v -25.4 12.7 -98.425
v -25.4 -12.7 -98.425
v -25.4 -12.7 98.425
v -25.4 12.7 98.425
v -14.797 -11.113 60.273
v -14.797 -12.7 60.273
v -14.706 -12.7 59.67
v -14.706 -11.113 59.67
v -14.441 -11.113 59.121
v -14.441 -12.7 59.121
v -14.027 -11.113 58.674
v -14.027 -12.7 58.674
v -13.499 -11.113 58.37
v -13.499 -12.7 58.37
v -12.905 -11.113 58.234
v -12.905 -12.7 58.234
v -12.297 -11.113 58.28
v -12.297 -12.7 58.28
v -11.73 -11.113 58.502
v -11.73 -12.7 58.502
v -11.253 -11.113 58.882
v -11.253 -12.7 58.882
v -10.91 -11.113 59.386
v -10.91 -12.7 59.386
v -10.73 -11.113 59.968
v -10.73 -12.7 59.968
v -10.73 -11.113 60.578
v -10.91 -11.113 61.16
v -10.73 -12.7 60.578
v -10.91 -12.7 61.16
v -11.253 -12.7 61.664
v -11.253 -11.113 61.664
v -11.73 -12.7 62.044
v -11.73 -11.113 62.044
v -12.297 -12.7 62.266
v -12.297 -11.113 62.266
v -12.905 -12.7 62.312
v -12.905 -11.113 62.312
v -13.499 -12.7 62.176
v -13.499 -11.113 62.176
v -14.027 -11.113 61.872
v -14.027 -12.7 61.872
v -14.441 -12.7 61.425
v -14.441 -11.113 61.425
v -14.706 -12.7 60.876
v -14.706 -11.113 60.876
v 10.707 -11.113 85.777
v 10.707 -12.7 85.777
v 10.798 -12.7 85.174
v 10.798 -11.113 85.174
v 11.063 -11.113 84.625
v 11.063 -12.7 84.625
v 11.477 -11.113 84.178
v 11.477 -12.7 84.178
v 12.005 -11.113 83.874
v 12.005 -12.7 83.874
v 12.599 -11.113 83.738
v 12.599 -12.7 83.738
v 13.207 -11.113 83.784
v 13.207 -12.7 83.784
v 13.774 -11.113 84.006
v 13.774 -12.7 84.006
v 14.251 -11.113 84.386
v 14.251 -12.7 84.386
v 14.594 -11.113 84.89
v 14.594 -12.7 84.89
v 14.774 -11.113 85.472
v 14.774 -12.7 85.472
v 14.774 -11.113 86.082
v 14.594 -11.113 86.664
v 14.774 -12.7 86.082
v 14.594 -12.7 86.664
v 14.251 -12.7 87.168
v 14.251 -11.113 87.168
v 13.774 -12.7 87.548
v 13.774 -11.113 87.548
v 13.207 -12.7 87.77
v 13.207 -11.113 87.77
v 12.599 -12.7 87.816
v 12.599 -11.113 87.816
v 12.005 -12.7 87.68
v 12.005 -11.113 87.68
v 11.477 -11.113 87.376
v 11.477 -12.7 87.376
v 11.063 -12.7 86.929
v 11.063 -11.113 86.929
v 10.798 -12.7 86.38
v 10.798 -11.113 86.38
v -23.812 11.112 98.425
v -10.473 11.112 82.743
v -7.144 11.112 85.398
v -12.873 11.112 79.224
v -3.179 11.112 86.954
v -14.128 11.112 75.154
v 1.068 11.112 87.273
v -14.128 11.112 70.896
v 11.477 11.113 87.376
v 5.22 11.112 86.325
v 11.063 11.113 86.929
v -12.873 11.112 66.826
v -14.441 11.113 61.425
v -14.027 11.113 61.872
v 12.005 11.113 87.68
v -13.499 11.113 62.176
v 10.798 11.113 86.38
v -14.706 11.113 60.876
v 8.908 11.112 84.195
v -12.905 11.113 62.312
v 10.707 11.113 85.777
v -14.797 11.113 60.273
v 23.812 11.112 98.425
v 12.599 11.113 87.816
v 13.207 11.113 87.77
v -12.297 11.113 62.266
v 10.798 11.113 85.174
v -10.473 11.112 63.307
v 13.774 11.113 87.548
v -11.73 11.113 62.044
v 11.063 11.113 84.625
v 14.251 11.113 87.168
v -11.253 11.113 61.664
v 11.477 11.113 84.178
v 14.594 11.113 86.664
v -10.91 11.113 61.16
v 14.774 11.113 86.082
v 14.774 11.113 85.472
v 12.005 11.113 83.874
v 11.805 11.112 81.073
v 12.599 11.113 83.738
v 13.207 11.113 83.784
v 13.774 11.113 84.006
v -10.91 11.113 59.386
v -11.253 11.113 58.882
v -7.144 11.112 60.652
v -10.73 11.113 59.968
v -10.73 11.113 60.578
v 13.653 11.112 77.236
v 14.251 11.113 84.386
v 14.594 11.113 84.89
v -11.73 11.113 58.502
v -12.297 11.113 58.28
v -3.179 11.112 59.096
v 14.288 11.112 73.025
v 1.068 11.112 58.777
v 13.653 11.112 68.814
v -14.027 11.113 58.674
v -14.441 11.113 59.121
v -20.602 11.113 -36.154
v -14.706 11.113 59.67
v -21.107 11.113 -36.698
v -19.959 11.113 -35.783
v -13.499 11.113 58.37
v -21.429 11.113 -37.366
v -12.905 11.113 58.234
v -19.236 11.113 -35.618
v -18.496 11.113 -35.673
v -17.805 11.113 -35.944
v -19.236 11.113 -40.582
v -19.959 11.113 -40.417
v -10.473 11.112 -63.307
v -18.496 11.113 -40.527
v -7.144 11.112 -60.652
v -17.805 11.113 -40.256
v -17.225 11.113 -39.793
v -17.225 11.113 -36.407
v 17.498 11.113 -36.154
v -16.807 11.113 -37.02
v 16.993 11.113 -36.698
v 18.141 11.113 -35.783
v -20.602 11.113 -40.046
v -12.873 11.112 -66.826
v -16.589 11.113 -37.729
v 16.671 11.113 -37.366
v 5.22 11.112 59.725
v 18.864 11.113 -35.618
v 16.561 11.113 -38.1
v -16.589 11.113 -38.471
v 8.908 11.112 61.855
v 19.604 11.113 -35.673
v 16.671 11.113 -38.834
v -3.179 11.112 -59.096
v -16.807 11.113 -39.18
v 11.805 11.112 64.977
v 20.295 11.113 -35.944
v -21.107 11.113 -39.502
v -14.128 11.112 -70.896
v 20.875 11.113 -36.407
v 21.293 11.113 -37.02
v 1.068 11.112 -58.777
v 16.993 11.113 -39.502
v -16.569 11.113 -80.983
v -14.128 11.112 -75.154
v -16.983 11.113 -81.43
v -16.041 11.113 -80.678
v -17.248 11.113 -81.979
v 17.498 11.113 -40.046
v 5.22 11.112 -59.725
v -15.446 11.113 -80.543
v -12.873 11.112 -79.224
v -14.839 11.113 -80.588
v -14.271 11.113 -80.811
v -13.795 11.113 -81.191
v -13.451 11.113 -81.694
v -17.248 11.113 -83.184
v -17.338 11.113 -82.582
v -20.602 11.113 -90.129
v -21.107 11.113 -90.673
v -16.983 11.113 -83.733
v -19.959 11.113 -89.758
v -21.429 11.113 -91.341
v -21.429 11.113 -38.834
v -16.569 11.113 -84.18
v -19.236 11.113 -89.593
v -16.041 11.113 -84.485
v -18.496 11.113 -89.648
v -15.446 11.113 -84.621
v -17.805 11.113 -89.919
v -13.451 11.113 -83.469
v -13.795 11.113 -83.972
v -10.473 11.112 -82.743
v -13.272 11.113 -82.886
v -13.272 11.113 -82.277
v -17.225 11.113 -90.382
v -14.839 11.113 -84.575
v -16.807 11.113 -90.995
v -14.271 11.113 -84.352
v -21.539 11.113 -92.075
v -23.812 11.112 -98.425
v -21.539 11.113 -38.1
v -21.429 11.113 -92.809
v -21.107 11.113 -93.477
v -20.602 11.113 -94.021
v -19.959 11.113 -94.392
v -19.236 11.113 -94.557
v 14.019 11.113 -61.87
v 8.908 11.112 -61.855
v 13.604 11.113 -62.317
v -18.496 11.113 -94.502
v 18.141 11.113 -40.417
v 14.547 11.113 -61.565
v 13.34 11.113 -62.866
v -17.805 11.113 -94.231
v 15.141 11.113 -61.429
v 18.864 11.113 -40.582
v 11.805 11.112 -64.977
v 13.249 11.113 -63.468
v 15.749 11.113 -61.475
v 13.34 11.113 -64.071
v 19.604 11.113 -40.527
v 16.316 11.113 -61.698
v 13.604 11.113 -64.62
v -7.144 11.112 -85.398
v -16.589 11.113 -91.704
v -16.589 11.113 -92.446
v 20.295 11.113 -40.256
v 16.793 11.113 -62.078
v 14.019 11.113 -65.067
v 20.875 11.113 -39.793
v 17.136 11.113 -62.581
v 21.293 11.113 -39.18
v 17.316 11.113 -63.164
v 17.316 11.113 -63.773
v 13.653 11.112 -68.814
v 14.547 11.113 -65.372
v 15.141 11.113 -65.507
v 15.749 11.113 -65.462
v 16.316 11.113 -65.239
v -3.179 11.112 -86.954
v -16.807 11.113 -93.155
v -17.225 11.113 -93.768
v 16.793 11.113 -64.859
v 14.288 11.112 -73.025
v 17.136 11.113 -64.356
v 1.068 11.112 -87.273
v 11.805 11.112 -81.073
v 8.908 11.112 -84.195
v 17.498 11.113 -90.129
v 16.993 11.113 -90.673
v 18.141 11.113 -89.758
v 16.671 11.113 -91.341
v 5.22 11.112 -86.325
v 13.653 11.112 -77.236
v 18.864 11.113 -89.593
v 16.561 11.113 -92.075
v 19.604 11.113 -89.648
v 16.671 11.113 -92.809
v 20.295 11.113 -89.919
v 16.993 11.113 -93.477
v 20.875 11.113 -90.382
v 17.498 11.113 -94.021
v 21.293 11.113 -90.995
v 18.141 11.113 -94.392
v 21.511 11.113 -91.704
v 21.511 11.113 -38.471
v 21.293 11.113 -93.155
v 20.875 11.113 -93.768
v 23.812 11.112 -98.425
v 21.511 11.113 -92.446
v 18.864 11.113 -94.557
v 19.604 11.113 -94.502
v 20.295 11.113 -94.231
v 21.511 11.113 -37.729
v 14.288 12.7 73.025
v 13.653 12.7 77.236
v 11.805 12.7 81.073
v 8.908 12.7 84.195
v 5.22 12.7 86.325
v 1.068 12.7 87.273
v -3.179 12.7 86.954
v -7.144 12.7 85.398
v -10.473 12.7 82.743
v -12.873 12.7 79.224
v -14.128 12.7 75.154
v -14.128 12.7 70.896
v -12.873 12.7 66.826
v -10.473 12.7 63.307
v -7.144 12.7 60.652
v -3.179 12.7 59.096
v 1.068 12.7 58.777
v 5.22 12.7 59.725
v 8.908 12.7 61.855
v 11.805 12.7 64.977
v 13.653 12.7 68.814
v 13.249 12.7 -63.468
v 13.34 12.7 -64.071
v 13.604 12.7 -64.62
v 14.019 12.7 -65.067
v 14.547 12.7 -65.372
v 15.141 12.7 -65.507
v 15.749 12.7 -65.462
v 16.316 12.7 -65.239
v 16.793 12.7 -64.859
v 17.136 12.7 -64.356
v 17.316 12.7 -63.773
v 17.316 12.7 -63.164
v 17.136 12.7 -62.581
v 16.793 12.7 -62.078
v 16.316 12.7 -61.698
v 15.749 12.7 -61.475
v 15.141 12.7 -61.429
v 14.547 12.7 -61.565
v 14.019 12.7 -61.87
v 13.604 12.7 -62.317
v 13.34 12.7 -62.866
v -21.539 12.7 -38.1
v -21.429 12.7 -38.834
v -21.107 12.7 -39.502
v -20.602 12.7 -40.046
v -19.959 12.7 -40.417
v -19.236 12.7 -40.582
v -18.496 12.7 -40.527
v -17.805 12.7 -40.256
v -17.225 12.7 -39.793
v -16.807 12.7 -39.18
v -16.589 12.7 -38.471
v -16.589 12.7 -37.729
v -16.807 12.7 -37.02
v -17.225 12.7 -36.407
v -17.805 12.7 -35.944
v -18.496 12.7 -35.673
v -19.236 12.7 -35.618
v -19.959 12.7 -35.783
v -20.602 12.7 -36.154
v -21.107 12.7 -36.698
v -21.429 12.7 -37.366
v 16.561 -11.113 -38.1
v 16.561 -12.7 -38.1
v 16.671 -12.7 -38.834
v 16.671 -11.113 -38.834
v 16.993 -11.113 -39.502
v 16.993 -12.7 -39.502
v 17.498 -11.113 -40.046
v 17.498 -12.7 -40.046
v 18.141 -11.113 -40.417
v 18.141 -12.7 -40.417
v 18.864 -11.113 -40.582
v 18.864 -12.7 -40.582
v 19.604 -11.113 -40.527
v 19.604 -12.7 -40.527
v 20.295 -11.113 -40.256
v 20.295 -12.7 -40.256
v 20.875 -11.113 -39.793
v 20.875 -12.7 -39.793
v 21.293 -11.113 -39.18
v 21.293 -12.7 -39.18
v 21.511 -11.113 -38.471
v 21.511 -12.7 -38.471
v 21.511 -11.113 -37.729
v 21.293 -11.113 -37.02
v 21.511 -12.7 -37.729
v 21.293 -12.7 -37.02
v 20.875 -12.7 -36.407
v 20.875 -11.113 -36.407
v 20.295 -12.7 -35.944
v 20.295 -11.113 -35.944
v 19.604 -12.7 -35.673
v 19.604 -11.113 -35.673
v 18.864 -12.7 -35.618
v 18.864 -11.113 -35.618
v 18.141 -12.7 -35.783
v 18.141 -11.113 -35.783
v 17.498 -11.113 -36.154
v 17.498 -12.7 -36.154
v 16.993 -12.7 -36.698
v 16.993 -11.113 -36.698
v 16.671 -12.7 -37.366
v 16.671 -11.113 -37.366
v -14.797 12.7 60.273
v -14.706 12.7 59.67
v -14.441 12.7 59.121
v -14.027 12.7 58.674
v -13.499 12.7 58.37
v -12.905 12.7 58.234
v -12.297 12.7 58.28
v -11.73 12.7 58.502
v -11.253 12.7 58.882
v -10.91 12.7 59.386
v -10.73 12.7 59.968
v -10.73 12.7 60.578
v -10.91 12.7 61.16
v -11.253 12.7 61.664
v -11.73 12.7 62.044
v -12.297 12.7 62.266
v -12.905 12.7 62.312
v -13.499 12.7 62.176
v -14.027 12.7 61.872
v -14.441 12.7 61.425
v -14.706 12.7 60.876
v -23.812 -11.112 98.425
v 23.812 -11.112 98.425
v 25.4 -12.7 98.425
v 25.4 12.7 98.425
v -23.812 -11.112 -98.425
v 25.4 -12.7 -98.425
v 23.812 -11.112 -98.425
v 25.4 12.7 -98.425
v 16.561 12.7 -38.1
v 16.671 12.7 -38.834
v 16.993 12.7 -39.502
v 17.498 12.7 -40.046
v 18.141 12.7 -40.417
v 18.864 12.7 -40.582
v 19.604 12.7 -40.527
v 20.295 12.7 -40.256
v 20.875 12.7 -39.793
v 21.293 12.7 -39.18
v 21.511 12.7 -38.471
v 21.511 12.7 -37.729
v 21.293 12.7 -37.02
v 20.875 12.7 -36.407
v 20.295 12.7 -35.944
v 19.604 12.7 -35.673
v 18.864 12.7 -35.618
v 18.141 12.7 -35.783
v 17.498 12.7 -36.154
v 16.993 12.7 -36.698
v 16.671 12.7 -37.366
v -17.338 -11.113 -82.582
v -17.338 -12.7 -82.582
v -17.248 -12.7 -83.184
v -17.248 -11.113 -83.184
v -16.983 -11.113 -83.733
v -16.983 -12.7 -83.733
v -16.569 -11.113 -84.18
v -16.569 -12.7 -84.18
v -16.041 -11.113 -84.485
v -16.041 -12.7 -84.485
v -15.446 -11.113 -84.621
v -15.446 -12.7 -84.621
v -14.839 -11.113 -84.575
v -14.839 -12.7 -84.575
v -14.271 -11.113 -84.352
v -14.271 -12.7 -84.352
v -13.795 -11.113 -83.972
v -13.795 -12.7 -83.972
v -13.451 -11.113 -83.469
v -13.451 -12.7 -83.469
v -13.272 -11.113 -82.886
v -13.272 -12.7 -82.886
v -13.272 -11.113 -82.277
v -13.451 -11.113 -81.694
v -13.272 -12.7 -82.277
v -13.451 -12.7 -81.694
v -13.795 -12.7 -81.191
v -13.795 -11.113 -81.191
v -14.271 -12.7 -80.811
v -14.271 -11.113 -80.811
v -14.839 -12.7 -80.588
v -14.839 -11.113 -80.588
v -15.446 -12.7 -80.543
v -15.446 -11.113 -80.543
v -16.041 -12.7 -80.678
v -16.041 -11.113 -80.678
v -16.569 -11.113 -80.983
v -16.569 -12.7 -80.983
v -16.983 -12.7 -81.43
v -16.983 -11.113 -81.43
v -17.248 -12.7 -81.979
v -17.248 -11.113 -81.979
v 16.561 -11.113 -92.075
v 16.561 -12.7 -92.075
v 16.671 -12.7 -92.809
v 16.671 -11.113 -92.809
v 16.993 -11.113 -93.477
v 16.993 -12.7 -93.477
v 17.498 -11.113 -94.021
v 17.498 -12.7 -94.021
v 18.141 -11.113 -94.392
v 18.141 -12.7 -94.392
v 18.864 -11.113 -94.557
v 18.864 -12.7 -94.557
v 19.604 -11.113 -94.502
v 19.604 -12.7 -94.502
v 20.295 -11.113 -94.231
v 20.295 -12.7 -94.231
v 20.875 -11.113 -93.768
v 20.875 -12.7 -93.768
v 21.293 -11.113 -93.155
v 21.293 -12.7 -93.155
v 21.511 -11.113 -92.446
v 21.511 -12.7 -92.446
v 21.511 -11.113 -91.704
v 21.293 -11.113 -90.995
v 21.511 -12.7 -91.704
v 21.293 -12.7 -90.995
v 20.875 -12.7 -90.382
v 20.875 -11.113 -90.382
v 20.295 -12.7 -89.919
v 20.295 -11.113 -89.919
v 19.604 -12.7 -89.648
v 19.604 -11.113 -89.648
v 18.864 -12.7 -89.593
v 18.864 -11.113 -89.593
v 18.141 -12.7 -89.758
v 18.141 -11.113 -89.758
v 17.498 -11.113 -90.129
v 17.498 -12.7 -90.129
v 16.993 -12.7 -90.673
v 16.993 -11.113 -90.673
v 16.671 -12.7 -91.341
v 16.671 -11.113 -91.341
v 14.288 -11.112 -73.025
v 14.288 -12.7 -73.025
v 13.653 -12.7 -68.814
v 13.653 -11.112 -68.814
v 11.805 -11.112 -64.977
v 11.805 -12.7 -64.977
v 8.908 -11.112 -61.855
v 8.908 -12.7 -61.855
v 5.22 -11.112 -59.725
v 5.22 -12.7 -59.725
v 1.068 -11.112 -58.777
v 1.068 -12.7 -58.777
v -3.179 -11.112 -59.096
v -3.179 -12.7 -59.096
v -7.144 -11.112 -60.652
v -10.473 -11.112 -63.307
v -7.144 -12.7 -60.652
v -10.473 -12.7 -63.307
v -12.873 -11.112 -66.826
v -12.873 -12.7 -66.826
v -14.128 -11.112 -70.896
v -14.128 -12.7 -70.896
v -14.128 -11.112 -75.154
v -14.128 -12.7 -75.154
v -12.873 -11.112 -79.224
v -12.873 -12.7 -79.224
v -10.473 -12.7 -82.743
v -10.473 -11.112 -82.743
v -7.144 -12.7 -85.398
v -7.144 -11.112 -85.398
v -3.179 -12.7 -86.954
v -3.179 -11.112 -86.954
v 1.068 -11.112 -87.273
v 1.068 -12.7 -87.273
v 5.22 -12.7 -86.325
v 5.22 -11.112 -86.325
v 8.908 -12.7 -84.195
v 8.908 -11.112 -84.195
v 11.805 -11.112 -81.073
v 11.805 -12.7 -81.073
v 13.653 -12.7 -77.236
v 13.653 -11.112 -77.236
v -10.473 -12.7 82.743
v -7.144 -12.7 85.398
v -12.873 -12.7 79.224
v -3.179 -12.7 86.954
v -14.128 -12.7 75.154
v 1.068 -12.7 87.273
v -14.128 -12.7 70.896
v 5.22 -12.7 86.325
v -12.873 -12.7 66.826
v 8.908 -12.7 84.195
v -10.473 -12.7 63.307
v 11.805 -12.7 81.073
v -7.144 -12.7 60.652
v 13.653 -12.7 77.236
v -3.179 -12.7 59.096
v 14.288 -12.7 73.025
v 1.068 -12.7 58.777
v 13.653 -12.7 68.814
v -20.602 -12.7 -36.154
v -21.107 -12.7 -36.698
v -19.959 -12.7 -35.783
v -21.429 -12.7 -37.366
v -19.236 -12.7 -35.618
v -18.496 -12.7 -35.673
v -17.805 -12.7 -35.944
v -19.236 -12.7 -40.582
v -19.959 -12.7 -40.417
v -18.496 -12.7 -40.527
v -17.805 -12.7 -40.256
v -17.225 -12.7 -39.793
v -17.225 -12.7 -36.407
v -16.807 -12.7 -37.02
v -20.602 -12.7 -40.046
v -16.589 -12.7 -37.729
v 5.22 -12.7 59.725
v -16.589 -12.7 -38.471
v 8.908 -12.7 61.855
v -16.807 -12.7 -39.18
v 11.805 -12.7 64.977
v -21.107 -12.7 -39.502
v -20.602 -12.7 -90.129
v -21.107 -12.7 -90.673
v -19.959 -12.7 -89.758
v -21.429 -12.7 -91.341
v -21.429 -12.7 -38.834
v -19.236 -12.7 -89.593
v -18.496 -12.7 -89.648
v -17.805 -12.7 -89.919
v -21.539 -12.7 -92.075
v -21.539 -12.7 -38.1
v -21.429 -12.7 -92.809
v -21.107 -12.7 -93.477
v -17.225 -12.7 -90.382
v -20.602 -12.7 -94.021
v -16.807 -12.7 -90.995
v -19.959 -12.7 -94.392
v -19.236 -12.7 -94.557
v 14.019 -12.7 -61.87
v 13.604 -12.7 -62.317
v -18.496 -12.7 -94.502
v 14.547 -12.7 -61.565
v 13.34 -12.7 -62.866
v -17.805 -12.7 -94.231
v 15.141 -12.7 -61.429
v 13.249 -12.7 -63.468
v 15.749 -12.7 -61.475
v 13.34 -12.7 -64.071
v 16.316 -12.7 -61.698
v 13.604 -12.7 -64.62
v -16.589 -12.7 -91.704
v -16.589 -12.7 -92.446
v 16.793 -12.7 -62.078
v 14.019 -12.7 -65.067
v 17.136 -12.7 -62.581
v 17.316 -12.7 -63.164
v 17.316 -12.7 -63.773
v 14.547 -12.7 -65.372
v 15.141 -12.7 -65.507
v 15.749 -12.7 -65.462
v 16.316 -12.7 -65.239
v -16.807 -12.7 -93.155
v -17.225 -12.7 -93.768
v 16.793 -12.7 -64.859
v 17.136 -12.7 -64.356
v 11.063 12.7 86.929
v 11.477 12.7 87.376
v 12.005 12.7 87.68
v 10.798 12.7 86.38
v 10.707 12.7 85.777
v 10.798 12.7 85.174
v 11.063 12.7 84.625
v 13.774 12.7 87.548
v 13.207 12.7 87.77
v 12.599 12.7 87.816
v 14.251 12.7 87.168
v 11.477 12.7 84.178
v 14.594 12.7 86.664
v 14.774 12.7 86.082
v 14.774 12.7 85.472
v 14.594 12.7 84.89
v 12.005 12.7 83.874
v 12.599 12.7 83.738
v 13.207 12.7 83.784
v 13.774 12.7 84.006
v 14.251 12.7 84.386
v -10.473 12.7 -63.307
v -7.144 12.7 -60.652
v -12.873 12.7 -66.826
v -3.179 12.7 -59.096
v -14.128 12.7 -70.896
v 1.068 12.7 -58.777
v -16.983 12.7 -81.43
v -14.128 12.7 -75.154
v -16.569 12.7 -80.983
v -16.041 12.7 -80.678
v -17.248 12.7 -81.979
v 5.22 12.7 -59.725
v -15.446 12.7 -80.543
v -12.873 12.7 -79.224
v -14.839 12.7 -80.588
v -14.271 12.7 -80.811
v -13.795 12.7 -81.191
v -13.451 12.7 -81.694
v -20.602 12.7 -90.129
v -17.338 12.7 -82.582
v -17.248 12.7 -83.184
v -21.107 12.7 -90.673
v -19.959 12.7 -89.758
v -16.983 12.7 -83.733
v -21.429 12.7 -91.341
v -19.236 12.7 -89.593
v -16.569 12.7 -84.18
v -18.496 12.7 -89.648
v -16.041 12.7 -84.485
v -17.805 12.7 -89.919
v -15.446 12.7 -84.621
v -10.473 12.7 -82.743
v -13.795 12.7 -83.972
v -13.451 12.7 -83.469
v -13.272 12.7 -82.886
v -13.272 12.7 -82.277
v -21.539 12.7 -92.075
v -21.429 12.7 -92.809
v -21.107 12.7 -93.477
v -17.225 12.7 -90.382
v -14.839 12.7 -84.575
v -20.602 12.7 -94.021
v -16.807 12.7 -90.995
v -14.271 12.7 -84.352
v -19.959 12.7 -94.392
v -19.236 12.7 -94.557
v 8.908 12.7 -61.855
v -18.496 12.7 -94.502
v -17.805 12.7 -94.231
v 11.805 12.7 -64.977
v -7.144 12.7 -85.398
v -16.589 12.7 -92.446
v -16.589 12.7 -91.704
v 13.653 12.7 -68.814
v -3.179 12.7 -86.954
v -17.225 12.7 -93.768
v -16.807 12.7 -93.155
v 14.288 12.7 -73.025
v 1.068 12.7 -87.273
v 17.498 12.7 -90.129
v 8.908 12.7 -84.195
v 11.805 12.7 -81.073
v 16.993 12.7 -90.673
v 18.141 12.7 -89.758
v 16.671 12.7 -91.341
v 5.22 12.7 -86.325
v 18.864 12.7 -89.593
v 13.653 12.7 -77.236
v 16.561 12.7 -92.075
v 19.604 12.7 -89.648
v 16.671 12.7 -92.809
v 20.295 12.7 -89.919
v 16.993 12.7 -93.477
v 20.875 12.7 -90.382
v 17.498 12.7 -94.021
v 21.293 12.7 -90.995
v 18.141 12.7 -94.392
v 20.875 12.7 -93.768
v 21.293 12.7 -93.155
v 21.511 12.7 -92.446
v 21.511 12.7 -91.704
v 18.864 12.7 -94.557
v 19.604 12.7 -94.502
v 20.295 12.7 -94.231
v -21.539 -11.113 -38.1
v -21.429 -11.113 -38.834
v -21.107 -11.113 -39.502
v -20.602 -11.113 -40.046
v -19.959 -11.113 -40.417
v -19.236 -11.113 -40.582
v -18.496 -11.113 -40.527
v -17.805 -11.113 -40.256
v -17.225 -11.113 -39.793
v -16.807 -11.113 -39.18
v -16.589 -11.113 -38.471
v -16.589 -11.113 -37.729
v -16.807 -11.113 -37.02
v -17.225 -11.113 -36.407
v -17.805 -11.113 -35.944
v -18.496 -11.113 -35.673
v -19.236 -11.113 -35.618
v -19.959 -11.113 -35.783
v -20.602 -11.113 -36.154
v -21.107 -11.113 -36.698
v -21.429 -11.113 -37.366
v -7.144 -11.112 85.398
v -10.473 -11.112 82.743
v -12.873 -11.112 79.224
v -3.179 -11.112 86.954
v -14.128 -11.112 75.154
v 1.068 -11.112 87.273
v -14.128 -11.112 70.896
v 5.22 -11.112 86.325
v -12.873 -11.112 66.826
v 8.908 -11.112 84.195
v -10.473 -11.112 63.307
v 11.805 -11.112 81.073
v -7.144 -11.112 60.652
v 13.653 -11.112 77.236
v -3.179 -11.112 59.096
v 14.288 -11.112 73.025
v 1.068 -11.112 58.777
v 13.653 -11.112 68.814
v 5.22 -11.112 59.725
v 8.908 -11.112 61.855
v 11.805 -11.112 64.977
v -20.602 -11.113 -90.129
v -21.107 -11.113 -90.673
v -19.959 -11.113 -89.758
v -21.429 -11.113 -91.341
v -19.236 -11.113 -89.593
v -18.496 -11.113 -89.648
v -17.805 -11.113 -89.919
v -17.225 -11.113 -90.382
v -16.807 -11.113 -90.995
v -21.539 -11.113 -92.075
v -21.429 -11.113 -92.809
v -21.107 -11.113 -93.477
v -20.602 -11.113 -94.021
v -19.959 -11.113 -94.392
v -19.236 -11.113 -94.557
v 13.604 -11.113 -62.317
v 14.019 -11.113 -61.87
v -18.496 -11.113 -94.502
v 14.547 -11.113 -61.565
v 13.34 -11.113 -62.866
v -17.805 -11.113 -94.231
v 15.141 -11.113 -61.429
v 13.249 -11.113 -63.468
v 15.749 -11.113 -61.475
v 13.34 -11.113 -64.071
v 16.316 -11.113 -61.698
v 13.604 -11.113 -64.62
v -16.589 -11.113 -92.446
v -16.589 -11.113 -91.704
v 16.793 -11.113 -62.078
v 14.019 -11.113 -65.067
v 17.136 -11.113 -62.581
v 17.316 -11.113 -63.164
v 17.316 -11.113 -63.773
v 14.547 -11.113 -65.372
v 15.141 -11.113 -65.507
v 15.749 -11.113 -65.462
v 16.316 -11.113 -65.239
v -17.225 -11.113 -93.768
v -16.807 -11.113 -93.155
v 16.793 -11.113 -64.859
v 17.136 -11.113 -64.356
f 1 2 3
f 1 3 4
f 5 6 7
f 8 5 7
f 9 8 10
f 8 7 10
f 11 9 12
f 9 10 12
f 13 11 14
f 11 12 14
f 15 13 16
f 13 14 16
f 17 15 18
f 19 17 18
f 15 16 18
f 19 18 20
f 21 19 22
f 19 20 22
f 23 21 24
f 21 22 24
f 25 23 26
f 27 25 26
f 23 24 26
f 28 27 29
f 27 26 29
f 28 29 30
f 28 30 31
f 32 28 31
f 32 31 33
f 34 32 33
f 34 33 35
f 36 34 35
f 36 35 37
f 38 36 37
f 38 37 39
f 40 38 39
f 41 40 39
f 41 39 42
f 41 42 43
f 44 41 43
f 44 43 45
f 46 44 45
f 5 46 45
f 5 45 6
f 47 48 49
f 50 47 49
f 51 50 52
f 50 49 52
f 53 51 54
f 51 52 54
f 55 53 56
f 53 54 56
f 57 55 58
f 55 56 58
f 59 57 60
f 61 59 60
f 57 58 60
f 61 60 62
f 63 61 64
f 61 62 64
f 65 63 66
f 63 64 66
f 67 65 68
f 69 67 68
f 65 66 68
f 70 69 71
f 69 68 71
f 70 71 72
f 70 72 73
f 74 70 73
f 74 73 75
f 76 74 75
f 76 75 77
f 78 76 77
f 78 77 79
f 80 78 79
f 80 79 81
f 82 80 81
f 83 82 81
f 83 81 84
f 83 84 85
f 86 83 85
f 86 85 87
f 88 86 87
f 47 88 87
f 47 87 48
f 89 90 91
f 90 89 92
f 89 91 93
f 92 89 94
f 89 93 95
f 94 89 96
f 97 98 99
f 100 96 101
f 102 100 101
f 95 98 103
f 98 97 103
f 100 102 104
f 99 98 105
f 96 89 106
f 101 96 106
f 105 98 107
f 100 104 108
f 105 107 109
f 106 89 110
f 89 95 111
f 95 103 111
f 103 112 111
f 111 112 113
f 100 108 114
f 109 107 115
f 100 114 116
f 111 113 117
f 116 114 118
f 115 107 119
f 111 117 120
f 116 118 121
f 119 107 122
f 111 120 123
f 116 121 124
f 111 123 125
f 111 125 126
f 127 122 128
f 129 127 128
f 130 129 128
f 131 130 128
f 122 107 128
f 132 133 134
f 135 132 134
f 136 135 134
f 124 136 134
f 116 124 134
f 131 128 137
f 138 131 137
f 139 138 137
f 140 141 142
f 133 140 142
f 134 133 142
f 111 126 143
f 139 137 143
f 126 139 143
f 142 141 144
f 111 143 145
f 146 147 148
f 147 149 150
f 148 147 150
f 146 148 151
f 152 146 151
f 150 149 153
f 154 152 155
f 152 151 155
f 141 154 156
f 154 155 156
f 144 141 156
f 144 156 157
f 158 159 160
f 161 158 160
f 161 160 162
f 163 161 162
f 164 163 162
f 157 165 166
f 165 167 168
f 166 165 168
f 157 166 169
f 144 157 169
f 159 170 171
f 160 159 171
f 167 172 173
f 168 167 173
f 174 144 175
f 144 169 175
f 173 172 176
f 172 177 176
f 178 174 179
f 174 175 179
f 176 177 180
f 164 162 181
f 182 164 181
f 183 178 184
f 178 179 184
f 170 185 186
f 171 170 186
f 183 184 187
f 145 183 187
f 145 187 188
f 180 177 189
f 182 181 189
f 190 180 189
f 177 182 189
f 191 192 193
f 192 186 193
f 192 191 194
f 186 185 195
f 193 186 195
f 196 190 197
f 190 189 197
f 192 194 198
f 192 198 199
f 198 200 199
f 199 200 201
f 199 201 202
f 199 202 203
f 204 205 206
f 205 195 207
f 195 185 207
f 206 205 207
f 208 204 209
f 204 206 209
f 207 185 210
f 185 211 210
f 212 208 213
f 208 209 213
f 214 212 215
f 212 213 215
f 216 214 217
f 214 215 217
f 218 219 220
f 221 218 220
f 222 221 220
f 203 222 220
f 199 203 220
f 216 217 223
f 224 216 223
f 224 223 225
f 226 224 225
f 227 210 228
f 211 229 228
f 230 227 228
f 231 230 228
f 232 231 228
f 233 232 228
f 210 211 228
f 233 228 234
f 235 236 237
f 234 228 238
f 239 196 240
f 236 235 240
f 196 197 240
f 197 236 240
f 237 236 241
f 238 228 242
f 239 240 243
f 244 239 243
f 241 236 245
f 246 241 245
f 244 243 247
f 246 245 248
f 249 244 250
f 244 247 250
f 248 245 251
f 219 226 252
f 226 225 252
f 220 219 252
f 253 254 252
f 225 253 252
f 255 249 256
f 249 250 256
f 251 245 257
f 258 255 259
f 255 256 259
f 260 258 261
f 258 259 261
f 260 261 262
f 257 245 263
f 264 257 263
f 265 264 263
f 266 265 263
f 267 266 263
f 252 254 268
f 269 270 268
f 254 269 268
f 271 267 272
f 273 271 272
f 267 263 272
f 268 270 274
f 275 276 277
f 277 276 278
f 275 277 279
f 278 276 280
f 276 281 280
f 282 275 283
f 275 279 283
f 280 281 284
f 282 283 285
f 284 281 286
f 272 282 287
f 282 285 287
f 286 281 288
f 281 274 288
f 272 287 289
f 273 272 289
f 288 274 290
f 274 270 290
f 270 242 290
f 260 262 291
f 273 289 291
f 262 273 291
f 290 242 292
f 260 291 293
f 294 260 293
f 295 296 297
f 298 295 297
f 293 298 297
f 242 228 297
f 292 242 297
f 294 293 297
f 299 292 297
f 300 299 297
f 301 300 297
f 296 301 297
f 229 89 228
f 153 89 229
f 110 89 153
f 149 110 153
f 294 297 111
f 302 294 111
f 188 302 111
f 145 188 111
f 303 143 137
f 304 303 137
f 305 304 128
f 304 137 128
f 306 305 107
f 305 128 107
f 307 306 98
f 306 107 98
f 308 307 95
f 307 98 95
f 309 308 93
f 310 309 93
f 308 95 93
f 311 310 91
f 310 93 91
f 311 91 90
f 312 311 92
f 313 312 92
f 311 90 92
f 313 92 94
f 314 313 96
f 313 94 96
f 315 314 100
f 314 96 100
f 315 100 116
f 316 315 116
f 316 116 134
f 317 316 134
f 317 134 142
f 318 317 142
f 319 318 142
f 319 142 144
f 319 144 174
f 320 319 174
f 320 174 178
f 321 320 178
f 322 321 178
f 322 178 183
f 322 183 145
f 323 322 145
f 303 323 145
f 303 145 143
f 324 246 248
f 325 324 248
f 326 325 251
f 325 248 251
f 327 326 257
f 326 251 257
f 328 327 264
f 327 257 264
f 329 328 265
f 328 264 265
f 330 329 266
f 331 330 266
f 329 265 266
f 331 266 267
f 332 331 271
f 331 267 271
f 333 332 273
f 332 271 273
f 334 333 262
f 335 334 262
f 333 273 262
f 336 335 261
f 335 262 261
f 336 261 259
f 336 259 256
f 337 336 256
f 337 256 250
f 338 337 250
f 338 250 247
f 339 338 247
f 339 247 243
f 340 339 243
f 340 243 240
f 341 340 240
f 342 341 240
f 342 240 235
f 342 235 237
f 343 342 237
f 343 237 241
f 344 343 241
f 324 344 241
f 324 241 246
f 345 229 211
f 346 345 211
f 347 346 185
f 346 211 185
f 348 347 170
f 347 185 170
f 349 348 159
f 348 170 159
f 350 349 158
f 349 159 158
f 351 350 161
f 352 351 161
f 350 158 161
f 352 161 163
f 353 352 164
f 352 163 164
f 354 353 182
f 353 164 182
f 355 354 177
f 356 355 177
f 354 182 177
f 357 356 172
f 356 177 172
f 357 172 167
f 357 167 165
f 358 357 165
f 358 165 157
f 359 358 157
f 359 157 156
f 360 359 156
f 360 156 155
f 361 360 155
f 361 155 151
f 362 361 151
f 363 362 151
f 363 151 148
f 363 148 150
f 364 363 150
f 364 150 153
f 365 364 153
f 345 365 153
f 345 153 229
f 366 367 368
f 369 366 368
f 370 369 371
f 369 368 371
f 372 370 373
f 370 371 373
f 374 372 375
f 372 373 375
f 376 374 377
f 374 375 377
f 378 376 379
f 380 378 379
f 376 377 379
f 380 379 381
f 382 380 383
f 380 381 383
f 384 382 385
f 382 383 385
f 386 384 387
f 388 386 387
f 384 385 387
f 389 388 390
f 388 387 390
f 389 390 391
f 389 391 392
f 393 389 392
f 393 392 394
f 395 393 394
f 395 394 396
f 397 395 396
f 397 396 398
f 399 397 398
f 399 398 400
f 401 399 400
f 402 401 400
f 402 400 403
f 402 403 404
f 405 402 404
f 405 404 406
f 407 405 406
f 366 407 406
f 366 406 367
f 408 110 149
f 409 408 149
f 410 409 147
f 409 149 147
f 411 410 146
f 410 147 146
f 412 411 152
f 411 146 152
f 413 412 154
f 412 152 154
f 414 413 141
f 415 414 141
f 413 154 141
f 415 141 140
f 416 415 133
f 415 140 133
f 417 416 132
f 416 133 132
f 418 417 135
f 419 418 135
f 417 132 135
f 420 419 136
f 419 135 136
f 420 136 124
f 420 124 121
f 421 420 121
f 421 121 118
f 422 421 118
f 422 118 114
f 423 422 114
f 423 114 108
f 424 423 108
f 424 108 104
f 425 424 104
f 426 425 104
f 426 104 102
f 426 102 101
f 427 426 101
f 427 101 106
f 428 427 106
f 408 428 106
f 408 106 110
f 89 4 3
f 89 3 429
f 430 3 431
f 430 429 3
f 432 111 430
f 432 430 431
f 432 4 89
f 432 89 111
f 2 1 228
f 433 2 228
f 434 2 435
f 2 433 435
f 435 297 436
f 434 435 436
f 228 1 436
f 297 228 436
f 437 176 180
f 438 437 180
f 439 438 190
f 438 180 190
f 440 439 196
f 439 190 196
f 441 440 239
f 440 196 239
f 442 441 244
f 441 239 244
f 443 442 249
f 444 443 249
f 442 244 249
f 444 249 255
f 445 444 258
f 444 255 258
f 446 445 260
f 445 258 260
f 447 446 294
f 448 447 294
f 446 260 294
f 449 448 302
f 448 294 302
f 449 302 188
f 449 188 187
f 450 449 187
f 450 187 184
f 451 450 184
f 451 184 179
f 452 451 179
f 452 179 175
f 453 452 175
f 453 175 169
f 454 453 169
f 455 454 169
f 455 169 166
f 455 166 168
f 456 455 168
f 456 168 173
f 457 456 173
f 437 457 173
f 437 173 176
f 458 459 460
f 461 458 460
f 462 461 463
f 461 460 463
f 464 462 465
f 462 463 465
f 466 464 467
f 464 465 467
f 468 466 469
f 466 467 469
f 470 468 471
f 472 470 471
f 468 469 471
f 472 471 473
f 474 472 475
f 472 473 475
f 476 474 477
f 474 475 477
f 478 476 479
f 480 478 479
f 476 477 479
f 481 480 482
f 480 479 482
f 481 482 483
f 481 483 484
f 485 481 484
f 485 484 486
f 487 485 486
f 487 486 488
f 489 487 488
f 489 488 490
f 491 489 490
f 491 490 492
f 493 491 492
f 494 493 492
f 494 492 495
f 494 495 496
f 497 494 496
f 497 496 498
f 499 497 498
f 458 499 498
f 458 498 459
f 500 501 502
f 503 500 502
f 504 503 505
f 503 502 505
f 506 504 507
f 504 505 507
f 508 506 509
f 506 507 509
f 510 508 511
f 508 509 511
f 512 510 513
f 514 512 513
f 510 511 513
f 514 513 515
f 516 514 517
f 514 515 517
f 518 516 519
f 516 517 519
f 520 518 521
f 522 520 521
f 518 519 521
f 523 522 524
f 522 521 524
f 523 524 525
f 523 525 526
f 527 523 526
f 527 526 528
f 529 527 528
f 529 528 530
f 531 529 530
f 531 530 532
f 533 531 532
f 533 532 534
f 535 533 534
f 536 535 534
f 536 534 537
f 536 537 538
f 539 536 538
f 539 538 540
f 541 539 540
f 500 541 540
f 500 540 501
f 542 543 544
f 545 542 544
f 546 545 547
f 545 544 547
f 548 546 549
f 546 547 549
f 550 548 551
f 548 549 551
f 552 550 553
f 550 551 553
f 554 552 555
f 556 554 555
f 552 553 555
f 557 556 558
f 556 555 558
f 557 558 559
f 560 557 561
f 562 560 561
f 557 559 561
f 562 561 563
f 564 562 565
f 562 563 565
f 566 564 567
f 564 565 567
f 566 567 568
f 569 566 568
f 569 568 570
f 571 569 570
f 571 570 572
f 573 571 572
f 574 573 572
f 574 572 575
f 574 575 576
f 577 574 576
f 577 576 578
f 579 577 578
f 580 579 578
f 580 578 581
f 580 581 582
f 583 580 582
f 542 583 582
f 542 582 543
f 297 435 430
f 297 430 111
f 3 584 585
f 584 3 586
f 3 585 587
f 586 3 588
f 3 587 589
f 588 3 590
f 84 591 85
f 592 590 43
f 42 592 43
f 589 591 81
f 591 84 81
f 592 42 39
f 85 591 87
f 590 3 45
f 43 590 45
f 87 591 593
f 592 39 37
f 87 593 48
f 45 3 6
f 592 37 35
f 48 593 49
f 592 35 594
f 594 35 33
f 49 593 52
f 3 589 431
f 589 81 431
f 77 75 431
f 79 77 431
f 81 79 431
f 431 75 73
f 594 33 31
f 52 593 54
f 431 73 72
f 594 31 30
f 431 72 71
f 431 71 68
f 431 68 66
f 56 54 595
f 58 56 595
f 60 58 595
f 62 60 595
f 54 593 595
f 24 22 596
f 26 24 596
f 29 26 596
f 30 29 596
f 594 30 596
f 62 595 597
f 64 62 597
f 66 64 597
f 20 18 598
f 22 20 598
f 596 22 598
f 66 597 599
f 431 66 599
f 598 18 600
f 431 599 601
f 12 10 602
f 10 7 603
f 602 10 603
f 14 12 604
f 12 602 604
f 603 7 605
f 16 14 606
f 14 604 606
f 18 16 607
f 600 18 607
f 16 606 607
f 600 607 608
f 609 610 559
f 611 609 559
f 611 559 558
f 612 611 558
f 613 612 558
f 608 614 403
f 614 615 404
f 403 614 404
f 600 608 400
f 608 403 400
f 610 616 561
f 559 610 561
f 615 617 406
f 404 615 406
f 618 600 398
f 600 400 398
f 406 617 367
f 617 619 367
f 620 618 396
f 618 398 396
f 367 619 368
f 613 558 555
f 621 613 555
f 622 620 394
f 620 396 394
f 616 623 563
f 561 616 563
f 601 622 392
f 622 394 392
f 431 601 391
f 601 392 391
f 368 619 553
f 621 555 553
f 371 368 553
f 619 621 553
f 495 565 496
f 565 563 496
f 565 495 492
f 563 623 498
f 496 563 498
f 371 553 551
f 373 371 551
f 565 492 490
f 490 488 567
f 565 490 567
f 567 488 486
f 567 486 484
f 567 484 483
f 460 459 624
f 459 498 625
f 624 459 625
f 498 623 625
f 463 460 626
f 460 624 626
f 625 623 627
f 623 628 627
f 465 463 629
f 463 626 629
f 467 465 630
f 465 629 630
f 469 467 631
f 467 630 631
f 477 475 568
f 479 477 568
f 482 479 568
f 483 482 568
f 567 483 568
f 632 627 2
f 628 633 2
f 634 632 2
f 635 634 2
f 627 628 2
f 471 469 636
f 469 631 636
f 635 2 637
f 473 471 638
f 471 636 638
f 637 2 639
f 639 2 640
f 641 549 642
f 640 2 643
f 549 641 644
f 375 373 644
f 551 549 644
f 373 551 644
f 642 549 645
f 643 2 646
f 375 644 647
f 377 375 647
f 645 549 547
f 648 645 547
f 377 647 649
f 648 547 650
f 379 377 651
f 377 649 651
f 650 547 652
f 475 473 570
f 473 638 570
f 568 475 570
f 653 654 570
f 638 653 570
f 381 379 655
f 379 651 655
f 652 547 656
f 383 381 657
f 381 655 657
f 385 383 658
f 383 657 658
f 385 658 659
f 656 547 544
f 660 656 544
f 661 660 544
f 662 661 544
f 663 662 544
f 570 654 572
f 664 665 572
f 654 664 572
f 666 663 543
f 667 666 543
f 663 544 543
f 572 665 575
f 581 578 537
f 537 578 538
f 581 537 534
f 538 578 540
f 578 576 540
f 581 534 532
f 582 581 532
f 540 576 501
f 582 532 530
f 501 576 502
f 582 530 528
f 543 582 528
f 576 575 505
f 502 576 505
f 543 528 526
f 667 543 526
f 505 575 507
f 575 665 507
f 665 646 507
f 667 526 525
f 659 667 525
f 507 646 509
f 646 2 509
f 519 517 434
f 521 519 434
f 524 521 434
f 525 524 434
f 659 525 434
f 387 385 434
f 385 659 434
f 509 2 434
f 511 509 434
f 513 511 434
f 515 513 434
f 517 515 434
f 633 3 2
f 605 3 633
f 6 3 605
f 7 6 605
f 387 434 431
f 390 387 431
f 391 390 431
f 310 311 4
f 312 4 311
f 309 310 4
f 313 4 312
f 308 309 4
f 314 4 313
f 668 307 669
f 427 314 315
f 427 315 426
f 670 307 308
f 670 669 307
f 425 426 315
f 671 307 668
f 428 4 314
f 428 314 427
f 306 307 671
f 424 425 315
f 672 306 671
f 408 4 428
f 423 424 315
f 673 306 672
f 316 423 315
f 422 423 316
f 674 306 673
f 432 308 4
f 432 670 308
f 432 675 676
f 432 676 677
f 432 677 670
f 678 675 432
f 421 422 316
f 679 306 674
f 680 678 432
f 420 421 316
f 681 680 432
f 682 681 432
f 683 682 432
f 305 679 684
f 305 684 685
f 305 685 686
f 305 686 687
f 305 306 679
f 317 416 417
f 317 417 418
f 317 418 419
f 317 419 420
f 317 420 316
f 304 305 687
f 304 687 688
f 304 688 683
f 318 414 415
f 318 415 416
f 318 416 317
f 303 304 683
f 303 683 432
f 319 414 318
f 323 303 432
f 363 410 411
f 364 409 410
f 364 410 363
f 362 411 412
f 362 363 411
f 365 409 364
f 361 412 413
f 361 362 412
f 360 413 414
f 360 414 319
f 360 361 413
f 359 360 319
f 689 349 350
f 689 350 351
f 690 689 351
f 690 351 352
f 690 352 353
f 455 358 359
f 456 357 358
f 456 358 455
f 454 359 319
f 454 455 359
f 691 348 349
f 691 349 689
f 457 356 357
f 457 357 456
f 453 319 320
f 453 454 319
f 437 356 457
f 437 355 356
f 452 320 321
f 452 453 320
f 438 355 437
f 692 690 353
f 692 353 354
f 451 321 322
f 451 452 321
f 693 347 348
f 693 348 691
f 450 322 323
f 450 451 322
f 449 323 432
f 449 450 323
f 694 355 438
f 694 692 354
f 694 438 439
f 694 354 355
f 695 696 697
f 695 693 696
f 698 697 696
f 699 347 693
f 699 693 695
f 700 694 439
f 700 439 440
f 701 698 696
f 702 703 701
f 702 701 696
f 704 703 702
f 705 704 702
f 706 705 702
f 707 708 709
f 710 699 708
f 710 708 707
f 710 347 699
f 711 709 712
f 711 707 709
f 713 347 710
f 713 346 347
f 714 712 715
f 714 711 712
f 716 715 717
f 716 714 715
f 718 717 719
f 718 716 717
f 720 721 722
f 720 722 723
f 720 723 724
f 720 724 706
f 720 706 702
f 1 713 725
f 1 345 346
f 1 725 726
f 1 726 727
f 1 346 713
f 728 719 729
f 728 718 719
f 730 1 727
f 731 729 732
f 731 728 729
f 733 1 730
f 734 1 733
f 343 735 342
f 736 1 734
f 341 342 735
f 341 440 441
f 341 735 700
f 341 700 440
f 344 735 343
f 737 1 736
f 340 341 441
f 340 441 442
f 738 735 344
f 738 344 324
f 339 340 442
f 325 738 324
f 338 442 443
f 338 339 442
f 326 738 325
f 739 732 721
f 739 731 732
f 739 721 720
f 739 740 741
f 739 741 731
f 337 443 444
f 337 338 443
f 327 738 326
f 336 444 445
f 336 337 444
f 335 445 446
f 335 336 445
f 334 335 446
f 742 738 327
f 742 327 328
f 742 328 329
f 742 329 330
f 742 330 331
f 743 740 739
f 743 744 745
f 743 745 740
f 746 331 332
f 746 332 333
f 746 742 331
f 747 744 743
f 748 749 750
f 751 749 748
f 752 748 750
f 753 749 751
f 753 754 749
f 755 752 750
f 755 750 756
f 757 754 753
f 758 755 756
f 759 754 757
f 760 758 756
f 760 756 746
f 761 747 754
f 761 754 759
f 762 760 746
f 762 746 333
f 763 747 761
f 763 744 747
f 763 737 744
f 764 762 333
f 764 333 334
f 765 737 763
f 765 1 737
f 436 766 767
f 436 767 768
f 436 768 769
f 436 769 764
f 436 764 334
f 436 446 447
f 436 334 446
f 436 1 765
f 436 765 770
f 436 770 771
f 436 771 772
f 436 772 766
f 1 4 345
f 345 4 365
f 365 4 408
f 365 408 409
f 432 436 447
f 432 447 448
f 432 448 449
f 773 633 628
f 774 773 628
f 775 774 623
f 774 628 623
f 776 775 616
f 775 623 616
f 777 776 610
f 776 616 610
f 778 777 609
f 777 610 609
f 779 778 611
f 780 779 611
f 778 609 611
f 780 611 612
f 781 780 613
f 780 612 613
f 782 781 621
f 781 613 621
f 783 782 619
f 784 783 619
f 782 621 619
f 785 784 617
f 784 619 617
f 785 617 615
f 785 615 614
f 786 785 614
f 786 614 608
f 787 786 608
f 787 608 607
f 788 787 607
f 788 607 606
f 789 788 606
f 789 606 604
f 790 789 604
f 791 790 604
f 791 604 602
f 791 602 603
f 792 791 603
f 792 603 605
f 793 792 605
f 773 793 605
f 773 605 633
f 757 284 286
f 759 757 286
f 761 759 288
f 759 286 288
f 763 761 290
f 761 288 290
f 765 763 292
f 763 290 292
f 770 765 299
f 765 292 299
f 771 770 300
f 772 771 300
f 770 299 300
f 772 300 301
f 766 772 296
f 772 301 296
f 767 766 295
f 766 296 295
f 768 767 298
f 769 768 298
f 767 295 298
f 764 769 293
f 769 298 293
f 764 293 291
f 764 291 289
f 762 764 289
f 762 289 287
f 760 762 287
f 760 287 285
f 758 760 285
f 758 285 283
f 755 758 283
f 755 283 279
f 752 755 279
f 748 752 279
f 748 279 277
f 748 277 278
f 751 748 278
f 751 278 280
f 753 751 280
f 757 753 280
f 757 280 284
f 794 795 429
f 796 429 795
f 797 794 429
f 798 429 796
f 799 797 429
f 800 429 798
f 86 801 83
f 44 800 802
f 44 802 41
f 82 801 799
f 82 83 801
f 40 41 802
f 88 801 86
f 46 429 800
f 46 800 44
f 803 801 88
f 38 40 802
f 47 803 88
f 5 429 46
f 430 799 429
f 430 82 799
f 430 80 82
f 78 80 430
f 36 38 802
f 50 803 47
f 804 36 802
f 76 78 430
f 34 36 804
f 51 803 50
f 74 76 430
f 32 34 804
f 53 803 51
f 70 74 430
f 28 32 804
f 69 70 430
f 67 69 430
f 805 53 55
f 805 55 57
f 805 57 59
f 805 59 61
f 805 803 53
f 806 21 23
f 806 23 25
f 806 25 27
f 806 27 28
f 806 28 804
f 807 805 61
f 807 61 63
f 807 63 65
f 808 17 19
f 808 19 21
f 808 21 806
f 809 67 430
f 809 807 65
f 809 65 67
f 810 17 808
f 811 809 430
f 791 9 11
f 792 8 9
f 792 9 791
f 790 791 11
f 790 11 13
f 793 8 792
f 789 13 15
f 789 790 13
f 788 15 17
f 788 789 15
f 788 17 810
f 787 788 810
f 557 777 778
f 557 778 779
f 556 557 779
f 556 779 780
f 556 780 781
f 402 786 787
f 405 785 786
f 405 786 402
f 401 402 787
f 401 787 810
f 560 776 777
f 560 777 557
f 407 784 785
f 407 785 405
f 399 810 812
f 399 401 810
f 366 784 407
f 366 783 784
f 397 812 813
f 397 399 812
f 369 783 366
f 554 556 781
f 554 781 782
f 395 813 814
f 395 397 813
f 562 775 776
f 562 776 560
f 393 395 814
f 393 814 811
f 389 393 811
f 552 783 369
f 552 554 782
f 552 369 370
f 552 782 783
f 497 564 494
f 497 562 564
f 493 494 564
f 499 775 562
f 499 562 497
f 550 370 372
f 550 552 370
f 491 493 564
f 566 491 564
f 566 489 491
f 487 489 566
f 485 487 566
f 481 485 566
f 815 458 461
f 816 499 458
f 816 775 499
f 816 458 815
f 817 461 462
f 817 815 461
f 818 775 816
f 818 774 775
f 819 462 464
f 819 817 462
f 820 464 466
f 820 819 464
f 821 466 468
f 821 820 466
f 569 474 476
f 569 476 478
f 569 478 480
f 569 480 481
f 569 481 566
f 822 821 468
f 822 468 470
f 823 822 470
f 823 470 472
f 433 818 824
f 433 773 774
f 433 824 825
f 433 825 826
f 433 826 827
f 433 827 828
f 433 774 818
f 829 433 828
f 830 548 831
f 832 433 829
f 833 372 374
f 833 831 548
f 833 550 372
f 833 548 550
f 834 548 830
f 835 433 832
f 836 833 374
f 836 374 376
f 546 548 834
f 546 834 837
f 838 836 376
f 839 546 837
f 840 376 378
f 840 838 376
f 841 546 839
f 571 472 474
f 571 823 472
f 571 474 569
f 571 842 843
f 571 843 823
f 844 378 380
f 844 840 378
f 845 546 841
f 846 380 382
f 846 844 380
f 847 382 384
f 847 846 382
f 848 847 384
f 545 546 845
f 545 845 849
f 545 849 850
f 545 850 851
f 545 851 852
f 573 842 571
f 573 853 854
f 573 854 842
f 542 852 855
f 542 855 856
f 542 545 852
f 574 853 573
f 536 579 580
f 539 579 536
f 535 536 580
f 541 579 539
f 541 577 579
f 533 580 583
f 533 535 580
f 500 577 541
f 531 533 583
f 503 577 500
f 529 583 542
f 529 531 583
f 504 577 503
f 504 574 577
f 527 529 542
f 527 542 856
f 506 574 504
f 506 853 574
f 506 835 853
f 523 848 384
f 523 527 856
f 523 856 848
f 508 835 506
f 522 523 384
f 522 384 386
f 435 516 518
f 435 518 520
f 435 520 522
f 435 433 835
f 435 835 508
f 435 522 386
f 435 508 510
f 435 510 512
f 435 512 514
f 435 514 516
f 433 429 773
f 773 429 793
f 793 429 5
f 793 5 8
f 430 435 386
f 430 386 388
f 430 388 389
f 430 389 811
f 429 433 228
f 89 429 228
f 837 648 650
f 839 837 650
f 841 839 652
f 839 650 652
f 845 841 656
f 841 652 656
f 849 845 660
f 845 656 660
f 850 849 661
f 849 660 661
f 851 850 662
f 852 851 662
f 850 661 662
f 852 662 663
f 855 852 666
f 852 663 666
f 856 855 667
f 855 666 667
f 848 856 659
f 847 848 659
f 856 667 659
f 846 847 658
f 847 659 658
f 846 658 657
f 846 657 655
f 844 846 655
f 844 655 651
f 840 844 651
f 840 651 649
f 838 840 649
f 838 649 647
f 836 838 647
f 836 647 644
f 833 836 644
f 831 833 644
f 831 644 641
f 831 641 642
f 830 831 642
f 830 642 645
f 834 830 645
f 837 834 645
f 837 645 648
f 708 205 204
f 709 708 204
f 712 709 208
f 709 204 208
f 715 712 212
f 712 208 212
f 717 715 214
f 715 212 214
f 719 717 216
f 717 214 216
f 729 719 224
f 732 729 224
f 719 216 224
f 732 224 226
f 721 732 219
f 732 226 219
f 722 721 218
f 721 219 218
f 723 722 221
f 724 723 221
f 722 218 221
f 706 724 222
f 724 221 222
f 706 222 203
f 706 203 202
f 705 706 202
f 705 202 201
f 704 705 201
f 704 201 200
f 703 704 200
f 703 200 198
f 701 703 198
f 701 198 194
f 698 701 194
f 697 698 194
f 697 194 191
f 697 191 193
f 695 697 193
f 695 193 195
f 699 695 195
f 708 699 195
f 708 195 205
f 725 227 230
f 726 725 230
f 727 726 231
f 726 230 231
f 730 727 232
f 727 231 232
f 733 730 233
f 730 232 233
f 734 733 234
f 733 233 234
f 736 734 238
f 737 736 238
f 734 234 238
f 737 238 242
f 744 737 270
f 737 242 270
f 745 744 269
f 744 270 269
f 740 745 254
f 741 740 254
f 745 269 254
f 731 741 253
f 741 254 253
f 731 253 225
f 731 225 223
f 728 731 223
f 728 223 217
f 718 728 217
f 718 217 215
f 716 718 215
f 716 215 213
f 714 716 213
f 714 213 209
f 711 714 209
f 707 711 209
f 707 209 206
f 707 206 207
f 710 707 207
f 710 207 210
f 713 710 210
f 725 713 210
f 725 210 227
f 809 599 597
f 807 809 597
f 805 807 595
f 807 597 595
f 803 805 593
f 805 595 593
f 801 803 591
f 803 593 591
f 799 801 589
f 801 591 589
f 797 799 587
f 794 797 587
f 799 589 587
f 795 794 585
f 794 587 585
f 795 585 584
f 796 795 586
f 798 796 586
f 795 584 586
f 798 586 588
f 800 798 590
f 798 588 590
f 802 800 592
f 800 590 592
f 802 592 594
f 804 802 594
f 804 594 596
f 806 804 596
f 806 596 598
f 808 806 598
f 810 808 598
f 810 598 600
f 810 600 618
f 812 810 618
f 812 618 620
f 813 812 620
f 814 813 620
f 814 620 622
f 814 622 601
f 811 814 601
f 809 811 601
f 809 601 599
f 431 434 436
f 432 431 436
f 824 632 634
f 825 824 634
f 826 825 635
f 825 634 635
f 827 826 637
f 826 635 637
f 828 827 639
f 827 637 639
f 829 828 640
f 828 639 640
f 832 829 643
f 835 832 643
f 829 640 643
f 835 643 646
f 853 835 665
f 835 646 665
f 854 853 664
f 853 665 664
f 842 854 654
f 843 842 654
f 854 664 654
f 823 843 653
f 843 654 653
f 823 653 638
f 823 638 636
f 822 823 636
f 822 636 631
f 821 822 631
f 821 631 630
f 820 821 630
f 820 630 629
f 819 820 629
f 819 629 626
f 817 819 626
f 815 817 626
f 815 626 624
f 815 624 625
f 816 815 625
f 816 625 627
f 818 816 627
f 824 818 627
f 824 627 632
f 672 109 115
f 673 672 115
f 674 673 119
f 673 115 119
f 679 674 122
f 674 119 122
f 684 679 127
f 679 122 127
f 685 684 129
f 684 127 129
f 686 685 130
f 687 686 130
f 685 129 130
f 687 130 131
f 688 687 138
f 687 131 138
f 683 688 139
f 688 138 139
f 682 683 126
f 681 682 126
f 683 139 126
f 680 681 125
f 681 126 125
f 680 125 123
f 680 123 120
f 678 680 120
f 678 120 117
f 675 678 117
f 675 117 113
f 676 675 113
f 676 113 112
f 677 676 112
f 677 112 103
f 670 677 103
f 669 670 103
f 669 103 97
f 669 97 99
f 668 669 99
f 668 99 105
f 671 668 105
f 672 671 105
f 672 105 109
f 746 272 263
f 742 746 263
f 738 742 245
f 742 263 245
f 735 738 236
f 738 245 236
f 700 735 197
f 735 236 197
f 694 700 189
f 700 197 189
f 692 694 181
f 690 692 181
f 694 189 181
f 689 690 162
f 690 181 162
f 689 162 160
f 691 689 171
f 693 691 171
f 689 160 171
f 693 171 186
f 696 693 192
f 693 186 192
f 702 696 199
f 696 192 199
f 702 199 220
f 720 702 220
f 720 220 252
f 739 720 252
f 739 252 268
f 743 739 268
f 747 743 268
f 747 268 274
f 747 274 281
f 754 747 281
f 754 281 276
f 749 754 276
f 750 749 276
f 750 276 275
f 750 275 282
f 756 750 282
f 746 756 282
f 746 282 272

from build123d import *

# Parameters (mm, degrees)
BOSS_EXTRUDE1_DEPTH         = 98.424999
BOSS_EXTRUDE1_DEPTH_BACK    = 98.424999
SKETCH3_W                   = 50.8
SKETCH3_H                   = 25.4
SKETCH3_W_2                 = 47.625
SKETCH3_H_2                 = 22.225
SKETCH4_R                   = 14.2875
CUT_EXTRUDE3_DEPTH          = 105.774999061
F_10_CLEARANCE_HOLE1_D      = 4.9784
F_20_0_161_DIAMETER_HOLE1_D = 4.0894
F_20_0_161_DIAMETER_HOLE2_D = 4.0894


with BuildPart() as part:
    # Sketch3 → Boss-Extrude1 (new, two sides: drawn at the far end of the back side and taken through both)
    with BuildSketch(Plane.XY.offset(-BOSS_EXTRUDE1_DEPTH_BACK)):
        Rectangle(SKETCH3_W, SKETCH3_H)
        Rectangle(SKETCH3_W_2, SKETCH3_H_2, mode=Mode.SUBTRACT)
    extrude(amount=BOSS_EXTRUDE1_DEPTH + BOSS_EXTRUDE1_DEPTH_BACK)

    # Sketch4 → Cut-Extrude3 (cut, through all)
    with BuildSketch(Plane.XZ.offset(12.7)):
        with Locations((0, 73.025)):
            Circle(SKETCH4_R)
        with Locations((0, -73.025)):
            Circle(SKETCH4_R)
    extrude(amount=-CUT_EXTRUDE3_DEPTH, mode=Mode.SUBTRACT)

    # #10 Clearance Hole1 (through all)
    with Locations(Plane(origin=(0, 12.7, 0), x_dir=(1, 0, 0), z_dir=(0, 1, 0))):
        with Locations((19.05, 38.099999492), (19.05, 92.074999492), (-19.05, 92.074999492), (-19.05, 38.099999492)):
            Hole(F_10_CLEARANCE_HOLE1_D / 2)

    # #20 (0.161) Diameter Hole1 (through all)
    with Locations(Plane(origin=(0, 12.7, 0), x_dir=(1, 0, 0), z_dir=(0, 1, 0))):
        with Locations((-12.751963692, -60.273036308), (12.751963691, -85.776963692)):
            Hole(F_20_0_161_DIAMETER_HOLE1_D / 2)

    # #20 (0.161) Diameter Hole2 (through all)
    with Locations(Plane(origin=(0, 12.7, 0), x_dir=(1, 0, 0), z_dir=(0, 1, 0))):
        with Locations((-15.293699364, 82.581564015), (15.293699363, 63.468435985)):
            Hole(F_20_0_161_DIAMETER_HOLE2_D / 2)


solid = part.part
